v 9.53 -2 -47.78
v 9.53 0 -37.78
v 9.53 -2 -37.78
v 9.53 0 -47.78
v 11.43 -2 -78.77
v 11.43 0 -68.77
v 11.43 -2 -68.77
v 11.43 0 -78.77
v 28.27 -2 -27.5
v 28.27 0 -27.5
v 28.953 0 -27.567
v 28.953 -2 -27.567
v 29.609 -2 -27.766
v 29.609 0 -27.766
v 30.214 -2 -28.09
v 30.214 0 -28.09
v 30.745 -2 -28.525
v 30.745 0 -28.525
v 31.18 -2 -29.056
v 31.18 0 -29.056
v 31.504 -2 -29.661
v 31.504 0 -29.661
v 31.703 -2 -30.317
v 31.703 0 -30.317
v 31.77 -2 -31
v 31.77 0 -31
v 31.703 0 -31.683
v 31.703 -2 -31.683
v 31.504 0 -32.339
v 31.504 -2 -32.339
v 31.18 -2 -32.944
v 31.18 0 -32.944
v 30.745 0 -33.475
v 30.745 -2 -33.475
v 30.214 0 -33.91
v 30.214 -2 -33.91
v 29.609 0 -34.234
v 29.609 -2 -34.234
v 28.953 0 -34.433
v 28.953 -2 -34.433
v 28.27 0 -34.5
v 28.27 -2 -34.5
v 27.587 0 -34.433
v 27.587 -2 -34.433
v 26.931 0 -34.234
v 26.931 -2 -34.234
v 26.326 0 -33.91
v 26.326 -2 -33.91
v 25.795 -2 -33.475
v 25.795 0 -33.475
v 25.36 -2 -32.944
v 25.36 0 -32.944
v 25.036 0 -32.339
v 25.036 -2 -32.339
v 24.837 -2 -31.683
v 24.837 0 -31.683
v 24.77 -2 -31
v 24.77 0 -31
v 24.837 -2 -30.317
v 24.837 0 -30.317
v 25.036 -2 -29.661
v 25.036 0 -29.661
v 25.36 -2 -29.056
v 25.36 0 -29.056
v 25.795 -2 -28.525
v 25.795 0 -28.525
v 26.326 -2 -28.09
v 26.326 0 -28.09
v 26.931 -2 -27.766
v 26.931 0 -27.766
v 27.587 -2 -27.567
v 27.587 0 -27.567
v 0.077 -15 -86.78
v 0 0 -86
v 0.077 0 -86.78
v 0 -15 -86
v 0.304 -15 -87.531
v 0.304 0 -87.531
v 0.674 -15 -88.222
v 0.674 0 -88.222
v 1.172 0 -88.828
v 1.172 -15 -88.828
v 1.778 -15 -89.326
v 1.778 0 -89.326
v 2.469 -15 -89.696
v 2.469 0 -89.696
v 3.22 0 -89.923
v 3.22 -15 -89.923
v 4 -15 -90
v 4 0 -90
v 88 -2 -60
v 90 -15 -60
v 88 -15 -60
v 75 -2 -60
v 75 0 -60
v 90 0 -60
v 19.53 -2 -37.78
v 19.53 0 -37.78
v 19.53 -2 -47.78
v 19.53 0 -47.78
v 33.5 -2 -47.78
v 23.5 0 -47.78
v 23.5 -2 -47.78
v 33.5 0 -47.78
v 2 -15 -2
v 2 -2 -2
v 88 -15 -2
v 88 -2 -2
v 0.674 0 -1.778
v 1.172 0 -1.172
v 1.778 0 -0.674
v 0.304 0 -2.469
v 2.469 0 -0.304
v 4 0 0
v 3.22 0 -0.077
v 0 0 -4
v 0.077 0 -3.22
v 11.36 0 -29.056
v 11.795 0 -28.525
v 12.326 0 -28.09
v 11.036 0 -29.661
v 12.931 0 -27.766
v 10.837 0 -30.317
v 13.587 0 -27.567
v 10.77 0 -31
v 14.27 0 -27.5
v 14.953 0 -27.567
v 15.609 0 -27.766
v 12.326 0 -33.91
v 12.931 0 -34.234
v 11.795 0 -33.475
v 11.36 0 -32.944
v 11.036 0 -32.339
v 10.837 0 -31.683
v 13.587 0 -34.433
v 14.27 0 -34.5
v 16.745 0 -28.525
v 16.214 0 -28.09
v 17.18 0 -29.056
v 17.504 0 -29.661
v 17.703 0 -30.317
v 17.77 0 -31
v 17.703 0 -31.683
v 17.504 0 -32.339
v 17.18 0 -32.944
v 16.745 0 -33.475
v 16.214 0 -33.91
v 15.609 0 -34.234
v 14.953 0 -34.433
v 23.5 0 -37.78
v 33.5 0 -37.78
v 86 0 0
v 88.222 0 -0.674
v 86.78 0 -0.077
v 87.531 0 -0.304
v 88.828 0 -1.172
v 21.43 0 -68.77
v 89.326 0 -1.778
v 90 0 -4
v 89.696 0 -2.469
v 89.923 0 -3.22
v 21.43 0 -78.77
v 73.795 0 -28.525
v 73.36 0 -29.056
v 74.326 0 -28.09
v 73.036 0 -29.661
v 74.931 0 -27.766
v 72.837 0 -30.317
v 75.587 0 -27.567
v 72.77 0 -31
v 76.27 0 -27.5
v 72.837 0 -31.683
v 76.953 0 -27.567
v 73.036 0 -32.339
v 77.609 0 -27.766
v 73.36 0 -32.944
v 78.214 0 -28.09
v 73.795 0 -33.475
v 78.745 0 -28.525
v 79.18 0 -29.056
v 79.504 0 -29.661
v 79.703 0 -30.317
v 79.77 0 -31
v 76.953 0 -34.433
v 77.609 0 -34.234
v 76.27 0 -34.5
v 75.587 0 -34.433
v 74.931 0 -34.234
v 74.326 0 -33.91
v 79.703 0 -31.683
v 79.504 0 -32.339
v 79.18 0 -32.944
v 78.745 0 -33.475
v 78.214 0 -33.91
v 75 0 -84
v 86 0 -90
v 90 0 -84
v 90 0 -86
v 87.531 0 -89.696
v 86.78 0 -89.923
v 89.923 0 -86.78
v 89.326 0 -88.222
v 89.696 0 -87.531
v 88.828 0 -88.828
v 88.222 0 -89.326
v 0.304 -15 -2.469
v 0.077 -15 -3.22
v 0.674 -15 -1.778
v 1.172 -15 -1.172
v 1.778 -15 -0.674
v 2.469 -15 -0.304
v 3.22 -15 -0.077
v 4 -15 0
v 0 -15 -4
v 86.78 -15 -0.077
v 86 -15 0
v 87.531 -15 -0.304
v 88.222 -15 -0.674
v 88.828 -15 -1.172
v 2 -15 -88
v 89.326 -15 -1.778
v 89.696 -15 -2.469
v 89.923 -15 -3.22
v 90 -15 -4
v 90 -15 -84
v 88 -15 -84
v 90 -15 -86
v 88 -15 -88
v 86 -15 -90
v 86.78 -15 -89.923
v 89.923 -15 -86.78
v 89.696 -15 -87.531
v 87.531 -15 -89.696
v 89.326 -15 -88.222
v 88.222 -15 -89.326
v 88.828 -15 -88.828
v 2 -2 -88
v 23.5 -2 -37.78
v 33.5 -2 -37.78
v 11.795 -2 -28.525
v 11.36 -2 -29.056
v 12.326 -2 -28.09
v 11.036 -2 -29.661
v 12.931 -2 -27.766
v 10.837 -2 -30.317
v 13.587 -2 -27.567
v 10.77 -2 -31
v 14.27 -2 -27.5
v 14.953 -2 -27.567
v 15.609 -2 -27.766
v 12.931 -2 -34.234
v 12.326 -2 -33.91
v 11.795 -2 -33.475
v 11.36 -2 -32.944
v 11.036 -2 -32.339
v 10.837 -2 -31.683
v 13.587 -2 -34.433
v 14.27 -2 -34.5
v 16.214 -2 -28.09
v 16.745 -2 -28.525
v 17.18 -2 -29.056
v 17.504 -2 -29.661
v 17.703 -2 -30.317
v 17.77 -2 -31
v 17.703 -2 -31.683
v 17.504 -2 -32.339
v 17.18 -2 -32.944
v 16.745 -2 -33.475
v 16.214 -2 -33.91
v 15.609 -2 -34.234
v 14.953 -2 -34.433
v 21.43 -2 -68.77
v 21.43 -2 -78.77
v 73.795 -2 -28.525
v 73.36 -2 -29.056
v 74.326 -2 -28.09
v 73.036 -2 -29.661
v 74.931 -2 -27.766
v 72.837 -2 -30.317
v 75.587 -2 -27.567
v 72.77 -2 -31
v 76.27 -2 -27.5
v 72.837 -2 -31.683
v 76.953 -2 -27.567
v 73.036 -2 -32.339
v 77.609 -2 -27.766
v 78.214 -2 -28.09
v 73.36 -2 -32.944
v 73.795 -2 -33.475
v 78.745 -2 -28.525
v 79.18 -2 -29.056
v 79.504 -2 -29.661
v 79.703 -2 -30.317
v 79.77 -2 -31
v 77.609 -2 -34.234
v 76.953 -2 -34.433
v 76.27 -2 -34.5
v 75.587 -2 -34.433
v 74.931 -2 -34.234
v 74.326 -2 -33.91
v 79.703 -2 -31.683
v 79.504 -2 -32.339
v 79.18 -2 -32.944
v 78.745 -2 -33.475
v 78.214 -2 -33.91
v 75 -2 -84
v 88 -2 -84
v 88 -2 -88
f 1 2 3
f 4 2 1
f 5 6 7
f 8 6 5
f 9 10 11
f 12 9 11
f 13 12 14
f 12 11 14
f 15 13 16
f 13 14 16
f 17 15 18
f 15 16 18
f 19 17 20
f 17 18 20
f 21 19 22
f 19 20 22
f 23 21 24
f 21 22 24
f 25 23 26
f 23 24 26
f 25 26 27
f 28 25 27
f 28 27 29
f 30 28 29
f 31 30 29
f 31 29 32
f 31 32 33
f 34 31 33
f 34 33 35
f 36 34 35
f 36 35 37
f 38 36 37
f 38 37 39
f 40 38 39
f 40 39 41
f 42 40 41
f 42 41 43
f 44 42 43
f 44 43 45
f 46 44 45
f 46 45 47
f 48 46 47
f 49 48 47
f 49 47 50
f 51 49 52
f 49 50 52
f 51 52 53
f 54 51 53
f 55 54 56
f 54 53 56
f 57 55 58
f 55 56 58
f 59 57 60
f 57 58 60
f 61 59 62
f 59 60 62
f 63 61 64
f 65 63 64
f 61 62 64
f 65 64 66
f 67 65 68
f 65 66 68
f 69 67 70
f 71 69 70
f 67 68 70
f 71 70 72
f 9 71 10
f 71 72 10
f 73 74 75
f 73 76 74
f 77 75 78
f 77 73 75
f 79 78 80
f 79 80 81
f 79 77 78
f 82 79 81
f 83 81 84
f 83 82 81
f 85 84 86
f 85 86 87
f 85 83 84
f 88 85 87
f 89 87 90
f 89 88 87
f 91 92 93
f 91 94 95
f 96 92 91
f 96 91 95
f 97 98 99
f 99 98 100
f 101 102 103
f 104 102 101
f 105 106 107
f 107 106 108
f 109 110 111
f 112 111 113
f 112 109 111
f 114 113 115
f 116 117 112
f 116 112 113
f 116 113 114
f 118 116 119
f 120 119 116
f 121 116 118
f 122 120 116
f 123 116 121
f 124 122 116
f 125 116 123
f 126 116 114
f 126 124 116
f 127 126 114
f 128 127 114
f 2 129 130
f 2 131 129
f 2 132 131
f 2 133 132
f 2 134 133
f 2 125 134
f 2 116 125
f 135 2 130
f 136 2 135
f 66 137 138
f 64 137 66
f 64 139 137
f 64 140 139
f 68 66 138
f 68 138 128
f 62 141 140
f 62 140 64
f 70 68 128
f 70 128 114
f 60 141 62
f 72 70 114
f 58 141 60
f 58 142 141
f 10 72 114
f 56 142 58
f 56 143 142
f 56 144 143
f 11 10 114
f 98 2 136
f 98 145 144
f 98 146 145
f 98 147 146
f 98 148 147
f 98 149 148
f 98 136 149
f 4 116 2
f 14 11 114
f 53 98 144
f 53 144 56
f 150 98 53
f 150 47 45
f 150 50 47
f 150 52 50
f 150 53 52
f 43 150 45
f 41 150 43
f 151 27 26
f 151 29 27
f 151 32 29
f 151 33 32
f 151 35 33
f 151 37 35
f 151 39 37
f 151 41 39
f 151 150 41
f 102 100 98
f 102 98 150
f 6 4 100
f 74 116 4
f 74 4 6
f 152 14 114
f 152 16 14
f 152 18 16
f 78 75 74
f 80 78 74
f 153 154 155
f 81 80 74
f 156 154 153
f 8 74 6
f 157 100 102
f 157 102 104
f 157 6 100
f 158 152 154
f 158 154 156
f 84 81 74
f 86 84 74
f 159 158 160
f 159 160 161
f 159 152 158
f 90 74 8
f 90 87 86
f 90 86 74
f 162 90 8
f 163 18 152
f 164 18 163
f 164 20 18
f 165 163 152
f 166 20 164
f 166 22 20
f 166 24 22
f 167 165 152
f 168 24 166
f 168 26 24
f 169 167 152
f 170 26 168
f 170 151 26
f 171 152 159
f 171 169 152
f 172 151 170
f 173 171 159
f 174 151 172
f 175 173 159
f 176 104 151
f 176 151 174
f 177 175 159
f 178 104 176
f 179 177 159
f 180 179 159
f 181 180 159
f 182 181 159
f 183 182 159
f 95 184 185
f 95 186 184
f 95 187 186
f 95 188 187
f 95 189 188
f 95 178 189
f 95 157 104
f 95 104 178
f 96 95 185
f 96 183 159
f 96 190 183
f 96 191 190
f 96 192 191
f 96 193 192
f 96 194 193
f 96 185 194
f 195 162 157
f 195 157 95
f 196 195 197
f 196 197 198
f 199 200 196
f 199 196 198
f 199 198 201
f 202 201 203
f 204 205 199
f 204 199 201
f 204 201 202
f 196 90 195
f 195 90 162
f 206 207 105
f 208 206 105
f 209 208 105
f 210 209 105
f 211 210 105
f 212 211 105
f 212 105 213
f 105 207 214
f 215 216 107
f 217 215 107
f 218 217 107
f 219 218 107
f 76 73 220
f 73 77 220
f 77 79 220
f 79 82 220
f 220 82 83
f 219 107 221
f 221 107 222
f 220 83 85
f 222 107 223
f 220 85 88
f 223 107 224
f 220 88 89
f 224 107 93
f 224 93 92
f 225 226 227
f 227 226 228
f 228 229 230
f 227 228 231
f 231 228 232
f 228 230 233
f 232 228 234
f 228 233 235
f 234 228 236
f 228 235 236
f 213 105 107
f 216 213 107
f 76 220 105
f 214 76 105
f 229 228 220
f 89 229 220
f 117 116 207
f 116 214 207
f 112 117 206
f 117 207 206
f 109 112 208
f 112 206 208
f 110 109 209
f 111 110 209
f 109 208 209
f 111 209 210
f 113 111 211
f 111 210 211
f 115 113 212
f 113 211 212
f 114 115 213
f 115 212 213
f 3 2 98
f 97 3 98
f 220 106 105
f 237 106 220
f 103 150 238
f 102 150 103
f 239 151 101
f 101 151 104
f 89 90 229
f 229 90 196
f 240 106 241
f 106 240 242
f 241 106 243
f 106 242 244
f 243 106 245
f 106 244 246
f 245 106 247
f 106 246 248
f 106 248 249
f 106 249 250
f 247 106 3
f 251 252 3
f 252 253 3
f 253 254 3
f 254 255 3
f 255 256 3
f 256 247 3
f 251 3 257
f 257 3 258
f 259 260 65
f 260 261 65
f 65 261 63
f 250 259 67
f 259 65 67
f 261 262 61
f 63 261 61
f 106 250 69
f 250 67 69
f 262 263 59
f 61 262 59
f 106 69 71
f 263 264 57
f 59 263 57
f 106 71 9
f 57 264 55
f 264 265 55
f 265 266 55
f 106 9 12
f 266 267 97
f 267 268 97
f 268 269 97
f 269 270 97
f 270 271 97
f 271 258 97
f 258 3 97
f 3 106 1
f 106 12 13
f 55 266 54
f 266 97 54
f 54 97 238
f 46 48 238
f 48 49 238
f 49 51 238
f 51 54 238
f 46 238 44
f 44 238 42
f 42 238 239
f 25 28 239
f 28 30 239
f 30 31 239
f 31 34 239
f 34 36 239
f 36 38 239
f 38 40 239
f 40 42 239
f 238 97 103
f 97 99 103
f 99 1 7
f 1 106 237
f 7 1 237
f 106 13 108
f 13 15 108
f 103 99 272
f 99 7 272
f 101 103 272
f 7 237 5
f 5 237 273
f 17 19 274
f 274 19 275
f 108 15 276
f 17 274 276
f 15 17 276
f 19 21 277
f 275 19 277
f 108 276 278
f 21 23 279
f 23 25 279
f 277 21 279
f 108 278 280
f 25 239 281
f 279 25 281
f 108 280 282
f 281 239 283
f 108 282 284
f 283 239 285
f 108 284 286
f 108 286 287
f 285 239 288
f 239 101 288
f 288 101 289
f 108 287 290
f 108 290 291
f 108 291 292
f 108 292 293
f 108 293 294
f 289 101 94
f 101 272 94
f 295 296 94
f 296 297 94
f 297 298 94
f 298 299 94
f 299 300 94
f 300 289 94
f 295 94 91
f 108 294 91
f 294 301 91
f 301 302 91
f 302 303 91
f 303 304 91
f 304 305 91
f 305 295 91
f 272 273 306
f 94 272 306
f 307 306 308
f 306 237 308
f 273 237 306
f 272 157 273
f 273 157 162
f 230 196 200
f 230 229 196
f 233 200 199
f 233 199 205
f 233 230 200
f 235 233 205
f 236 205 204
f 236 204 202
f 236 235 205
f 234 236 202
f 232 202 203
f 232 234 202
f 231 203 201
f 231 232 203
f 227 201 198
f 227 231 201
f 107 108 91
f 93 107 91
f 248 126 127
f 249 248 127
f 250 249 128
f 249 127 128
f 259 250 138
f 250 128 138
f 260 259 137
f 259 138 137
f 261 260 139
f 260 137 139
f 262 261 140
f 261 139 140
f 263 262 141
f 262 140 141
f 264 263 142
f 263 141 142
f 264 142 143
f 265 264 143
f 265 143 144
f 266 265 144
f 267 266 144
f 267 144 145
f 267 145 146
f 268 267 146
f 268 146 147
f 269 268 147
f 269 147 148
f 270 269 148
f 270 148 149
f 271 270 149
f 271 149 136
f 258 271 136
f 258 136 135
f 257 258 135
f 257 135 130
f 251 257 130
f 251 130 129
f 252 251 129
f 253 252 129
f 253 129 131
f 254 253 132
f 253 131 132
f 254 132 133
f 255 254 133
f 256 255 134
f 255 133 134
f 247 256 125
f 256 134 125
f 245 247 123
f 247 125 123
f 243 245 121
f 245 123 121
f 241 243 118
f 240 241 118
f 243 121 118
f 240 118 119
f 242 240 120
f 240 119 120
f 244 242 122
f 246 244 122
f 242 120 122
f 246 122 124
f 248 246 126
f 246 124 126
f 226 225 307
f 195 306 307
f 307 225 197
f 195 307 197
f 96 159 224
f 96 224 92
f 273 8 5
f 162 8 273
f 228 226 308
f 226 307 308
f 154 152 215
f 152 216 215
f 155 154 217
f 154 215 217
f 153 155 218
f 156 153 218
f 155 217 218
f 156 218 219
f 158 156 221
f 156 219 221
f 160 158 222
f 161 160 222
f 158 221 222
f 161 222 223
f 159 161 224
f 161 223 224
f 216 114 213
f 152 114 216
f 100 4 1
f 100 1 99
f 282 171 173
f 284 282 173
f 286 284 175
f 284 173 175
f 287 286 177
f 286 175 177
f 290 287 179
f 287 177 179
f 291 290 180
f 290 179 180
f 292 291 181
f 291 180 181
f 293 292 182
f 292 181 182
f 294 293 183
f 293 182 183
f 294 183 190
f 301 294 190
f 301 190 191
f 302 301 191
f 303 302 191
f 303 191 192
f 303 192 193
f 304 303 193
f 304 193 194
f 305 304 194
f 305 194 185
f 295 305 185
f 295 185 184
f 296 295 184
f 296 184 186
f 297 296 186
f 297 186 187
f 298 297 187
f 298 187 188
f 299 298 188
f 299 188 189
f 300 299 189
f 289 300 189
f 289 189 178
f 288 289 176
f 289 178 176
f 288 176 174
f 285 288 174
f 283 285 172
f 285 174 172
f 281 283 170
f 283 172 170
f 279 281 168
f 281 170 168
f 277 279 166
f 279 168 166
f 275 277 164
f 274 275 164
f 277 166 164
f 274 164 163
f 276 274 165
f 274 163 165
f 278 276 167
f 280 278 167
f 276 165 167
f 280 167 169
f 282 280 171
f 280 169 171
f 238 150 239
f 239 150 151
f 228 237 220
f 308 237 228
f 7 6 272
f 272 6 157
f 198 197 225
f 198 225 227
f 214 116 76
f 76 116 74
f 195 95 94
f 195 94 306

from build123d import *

# Parameters (mm, degrees)
SKETCH1_W           = 90
SKETCH1_H           = 90
BOSS_EXTRUDE1_DEPTH = 15
SKETCH2_W           = 24
SKETCH2_H           = 15
CUT_EXTRUDE1_DEPTH  = 15
SHELL1_T            = -2
SKETCH3_R           = 3.5
CUT_EXTRUDE2_DEPTH  = 4
SKETCH4_W           = 10
SKETCH4_H           = 10
CUT_EXTRUDE3_DEPTH  = 4
FILLET1_R           = 4


with BuildPart() as part:
    # Sketch1 → Boss-Extrude1 (new body)
    with BuildSketch(Plane(origin=(0, 0, 0), x_dir=(1, 0, 0), z_dir=(0, 1, 0))):
        with Locations((45, 45)):
            Rectangle(SKETCH1_W, SKETCH1_H)
    extrude(amount=-BOSS_EXTRUDE1_DEPTH)

    # Sketch2 → Cut-Extrude1 (cut)
    with BuildSketch(Plane(origin=(90, 0, 0), x_dir=(0, 0, -1), z_dir=(1, 0, 0))):
        with Locations((72, -7.5)):
            Rectangle(SKETCH2_W, SKETCH2_H)
    extrude(amount=-CUT_EXTRUDE1_DEPTH, mode=Mode.SUBTRACT)

    # Shell1
    shell1_openings = [part.faces().sort_by_distance(p)[0] for p in [
        (43.255813953, -15, -43.744186047),
        (82.5, -7.5, -60),
        (82.5, -7.5, -84),
        (75, -7.5, -72),
    ]]
    offset(amount=SHELL1_T, openings=shell1_openings, kind=Kind.INTERSECTION)

    # Sketch3 → Cut-Extrude2 (cut)
    with BuildSketch(Plane(origin=(0, 0, 0), x_dir=(1, 0, 0), z_dir=(0, 1, 0))):
        with Locations(Location((14.27, 31, 0), (0, 0, 270))):
            Circle(SKETCH3_R)
        with Locations(Location((28.27, 31, 0), (0, 0, 270))):
            Circle(SKETCH3_R)
        with Locations(Location((76.27, 31, 0), (0, 0, 270))):
            Circle(SKETCH3_R)
    extrude(amount=-CUT_EXTRUDE2_DEPTH, mode=Mode.SUBTRACT)

    # Sketch4 → Cut-Extrude3 (cut)
    with BuildSketch(Plane(origin=(0, 0, 0), x_dir=(1, 0, 0), z_dir=(0, 1, 0))):
        with Locations((14.53, 42.78)):
            Rectangle(SKETCH4_W, SKETCH4_H)
        with Locations((28.5, 42.78)):
            Rectangle(SKETCH4_W, SKETCH4_H)
        with Locations((16.43, 73.77)):
            Rectangle(SKETCH4_W, SKETCH4_H)
    extrude(amount=-CUT_EXTRUDE3_DEPTH, mode=Mode.SUBTRACT)

    # Fillet1
    fillet1_edges = [part.edges().sort_by_distance(p)[0] for p in [
        (0, -7.5, -90),
        (90, -7.5, -90),
        (90, -7.5, 0),
        (0, -7.5, 0),
    ]]
    fillet(fillet1_edges, radius=FILLET1_R)


solid = part.part
